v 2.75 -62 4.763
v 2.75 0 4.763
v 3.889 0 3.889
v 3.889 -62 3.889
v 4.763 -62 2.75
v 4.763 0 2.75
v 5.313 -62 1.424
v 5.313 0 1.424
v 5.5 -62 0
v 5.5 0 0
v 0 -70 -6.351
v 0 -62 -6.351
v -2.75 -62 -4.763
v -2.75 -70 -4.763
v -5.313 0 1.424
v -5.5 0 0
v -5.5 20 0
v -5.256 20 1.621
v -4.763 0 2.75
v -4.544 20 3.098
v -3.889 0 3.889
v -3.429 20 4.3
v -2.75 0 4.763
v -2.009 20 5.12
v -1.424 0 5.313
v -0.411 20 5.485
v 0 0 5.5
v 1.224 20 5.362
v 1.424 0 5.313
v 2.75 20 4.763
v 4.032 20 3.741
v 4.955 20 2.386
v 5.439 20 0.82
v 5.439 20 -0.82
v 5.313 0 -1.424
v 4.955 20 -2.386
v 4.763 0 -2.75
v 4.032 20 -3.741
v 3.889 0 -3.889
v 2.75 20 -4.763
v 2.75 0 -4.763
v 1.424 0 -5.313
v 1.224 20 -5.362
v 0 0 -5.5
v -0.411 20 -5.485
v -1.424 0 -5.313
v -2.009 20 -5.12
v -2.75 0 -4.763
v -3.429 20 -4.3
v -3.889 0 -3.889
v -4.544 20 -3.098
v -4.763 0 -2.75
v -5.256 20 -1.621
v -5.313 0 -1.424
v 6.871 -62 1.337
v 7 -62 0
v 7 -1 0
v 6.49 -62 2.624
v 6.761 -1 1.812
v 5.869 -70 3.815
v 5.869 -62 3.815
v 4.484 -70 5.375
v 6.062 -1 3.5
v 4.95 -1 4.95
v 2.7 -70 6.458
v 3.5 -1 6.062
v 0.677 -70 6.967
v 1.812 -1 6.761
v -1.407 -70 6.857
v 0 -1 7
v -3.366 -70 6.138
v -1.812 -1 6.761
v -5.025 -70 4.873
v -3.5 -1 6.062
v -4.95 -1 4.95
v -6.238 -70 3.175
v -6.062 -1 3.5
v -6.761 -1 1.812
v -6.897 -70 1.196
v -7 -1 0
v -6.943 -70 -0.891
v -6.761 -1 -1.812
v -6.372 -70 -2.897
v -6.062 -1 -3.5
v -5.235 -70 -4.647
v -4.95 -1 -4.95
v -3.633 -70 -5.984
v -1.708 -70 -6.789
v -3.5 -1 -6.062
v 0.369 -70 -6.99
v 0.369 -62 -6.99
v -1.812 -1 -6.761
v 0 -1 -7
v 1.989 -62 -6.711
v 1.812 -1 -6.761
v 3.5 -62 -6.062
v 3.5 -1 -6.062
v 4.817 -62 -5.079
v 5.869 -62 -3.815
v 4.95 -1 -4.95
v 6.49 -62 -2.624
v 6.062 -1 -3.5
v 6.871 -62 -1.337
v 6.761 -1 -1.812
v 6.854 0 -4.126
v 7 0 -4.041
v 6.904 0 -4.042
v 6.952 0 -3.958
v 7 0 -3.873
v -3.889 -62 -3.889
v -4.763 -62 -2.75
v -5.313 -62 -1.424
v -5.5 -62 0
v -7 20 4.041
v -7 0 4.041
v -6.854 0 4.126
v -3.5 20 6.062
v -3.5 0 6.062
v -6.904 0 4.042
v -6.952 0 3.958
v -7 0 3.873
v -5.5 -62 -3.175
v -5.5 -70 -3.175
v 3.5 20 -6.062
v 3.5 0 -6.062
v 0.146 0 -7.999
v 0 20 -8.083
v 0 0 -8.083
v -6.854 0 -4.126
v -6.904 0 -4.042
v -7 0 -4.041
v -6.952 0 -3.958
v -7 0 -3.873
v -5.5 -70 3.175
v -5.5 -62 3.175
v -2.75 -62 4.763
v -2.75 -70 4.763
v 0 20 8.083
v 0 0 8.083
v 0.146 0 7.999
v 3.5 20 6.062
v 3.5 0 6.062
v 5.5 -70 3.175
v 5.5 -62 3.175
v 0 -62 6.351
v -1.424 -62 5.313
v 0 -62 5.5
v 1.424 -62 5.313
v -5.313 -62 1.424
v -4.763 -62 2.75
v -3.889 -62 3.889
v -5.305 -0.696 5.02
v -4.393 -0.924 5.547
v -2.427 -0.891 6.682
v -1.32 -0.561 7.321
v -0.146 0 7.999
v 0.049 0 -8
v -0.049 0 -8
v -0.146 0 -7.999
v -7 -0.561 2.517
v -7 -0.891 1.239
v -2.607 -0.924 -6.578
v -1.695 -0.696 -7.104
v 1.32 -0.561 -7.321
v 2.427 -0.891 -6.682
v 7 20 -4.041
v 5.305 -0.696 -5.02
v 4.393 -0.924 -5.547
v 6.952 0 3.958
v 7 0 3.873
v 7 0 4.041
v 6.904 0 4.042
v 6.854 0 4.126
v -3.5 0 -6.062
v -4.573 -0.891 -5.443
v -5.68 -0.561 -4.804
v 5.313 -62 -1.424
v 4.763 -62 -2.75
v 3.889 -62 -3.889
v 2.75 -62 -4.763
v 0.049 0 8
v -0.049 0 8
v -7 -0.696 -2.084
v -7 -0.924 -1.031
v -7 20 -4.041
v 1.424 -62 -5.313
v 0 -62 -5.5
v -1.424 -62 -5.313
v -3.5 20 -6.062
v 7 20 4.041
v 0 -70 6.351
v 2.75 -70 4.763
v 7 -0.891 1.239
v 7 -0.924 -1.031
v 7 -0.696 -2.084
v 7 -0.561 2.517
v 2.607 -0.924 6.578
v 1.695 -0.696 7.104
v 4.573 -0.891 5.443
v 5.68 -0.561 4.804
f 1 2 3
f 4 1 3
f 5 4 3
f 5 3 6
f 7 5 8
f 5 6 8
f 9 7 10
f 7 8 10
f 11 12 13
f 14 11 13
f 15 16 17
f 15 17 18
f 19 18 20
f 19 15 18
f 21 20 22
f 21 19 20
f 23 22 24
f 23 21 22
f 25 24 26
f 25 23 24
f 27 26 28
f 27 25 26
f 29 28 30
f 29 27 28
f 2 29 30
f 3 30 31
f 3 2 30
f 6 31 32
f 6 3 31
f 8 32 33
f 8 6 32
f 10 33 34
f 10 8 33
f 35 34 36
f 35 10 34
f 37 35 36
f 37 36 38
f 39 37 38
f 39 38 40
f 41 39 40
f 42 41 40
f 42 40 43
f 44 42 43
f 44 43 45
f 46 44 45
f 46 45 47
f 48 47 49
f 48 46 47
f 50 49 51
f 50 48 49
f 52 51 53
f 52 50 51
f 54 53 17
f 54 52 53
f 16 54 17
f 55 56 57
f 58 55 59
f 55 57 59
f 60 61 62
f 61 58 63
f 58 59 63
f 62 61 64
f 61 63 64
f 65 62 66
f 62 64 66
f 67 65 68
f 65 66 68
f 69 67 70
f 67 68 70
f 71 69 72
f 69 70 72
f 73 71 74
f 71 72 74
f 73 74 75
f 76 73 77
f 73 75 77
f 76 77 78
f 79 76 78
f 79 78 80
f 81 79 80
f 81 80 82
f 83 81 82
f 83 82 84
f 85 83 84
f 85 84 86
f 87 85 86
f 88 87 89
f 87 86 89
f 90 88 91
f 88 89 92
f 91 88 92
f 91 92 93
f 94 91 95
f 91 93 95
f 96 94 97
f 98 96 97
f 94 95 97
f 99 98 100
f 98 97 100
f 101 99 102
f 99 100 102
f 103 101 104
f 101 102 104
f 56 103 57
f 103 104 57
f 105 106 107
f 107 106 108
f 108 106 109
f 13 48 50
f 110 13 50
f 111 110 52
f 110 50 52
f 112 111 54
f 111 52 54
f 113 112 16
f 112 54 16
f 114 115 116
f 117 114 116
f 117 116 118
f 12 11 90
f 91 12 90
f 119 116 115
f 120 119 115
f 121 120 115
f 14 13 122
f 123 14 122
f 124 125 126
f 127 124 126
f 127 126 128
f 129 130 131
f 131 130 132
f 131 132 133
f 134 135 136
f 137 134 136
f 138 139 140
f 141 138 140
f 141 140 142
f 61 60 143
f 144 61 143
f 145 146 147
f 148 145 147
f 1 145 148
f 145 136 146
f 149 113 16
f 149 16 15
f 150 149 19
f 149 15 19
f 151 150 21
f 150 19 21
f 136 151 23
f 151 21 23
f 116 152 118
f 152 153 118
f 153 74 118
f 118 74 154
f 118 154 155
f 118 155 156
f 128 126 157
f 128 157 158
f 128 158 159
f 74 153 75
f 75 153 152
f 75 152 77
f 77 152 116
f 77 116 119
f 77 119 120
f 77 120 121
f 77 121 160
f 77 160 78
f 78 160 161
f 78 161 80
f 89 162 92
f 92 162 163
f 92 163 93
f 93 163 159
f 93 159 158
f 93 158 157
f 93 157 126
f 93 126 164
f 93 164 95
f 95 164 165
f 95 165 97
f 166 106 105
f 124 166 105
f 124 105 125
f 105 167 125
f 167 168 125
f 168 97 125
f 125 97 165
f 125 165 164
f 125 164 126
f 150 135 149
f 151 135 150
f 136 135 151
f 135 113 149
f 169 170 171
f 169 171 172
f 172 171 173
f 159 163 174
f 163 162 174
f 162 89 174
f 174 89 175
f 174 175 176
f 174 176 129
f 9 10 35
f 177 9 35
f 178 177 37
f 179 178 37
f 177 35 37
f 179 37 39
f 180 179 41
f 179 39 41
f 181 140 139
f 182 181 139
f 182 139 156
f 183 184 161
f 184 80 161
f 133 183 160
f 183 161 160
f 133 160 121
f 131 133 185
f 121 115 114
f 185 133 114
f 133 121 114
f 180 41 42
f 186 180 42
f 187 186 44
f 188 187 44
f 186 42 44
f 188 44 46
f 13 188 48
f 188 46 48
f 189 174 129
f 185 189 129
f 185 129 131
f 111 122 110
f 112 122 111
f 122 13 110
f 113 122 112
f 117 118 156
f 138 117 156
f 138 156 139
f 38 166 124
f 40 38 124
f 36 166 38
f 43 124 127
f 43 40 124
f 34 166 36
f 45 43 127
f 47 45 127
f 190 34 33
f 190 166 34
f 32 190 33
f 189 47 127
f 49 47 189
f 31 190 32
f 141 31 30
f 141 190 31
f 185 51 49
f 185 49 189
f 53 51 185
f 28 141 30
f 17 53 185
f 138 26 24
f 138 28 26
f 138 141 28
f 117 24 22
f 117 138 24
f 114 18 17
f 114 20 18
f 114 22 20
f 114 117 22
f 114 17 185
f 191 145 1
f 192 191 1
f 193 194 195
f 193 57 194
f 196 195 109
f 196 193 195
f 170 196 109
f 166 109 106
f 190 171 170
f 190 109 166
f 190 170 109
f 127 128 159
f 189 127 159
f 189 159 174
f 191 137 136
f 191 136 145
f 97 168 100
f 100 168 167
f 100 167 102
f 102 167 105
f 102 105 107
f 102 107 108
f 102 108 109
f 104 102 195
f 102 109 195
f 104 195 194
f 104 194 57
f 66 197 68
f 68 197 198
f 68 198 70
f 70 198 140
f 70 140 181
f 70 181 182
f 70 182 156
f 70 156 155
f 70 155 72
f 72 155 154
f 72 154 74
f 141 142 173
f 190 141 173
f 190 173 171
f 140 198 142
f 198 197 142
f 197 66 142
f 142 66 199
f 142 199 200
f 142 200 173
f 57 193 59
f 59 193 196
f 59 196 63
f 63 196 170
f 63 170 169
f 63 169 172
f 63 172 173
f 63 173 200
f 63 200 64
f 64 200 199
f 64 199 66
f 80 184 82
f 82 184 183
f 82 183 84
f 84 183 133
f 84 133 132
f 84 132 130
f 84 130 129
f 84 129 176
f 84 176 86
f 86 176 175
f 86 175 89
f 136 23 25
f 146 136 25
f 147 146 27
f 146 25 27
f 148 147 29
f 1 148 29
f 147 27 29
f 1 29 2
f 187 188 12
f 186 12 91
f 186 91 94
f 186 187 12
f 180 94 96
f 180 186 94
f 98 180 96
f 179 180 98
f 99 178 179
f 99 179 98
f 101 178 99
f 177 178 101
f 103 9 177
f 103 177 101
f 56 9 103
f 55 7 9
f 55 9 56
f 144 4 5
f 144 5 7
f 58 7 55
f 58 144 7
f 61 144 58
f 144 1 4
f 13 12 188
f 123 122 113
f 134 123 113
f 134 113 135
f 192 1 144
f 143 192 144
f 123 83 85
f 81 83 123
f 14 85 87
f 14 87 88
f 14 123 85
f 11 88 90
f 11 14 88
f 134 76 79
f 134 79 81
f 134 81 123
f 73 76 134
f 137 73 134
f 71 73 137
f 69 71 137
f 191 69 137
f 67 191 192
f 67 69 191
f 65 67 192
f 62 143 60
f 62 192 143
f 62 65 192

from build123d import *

# Parameters (mm, degrees)
F0_R         = 7
F1_DEPTH     = 70
F2_DEPTH     = 62
F3_R         = 5.5
F4_DEPTH     = 20
F6_DEPTH     = 8
F7_T4_ANGLE  = 59.9999999128
F7_T10_ANGLE = 59.9999996333
F7_T16_ANGLE = 60.0000004539
F7_T22_ANGLE = 59.9999999128
F7_T28_ANGLE = 60.0000002811
F7_T34_ANGLE = 59.9999998061


# Not quite as in the source:
# - a fillet or chamfer that OpenCascade refuses, or shapes differently, is made with other operations: its cross-section is extruded or revolved along the edge and cut away or added


with BuildPart() as f1:
    # F0 (on Front) → F1 (new body)
    with BuildSketch(Plane.XZ):
        Circle(F0_R)
        Polygon((2.7500007272, 4.7631393009), (5.5, 3.1754264805), (5.5, 0), (5.5, -3.1754264805), (2.7499994424, -4.7631400427), (0, -6.3508529611), (-2.7500008008, -4.7631392585), (-5.5, -3.1754264805), (-5.5, 0), (-5.5, 3.1754264805), (-2.7500002446, 4.7631395796), (0, 6.3508529611), align=None, mode=Mode.SUBTRACT)
    extrude(amount=F1_DEPTH)

    # F0 (on Front) → F2 (join)
    with BuildSketch(Plane.XZ):
        with BuildLine():
            Line((5.5, -3.1754264805), (5.5, 0))
            ThreePointArc((5.5, 0), (4.7631395599, -2.7500002788), (2.7499994424, -4.7631400427))
            Line((2.7499994424, -4.7631400427), (5.5, -3.1754264805))
        make_face()
        with BuildLine():
            Line((0, -6.3508529611), (2.7499994424, -4.7631400427))
            ThreePointArc((2.7499994424, -4.7631400427), (-7.842e-07, -5.5), (-2.7500008008, -4.7631392585))
            Line((-2.7500008008, -4.7631392585), (0, -6.3508529611))
        make_face()
        with BuildLine():
            Line((-5.5, -3.1754264805), (-2.7500008008, -4.7631392585))
            ThreePointArc((-2.7500008008, -4.7631392585), (-4.763139952, -2.7499995996), (-5.5, 0))
            Line((-5.5, 0), (-5.5, -3.1754264805))
        make_face()
        with BuildLine():
            ThreePointArc((-5.5, 0), (-4.7631397914, 2.7499998777), (-2.7500002446, 4.7631395796))
            Line((-2.7500002446, 4.7631395796), (-5.5, 3.1754264805))
            Line((-5.5, 3.1754264805), (-5.5, 0))
        make_face()
        with BuildLine():
            ThreePointArc((-2.7500002446, 4.7631395796), (2.787e-07, 5.5), (2.7500007272, 4.7631393009))
            Line((2.7500007272, 4.7631393009), (0, 6.3508529611))
            Line((0, 6.3508529611), (-2.7500002446, 4.7631395796))
        make_face()
        with BuildLine():
            Line((5.5, 0), (5.5, 3.1754264805))
            Line((5.5, 3.1754264805), (2.7500007272, 4.7631393009))
            ThreePointArc((2.7500007272, 4.7631393009), (4.7631399308, 2.7499996364), (5.5, 0))
        make_face()
    extrude(amount=F2_DEPTH)

    # F3 (on face) → F4 (join)
    with BuildSketch(Plane(origin=(0, 0, 0), x_dir=(-1, 0, 0), z_dir=(0, 1, 0))):
        with BuildLine():
            Line((-7, 0), (-7, -4.0414518843))
            Line((-7, -4.0414518843), (-3.5000000457, -6.0621778001))
            ThreePointArc((-3.5000000457, -6.0621778001), (-6.0621778397, -3.4999999772), (-7, 0))
        make_face()
        with BuildLine():
            Line((-7, 4.0414518843), (-7, 0))
            ThreePointArc((-7, 0), (-6.0621778147, 3.5000000204), (-3.4999999591, 6.0621778501))
            Line((-3.4999999591, 6.0621778501), (-7, 4.0414518843))
        make_face()
        with BuildLine():
            ThreePointArc((-3.4999999591, 6.0621778501), (-6.0621778147, 3.5000000204), (-7, 0))
            ThreePointArc((-7, 0), (-6.0621778397, -3.4999999772), (-3.5000000457, -6.0621778001))
            ThreePointArc((-3.5000000457, -6.0621778001), (-3.61e-08, -7), (3.4999999831, -6.0621778362))
            ThreePointArc((3.4999999831, -6.0621778362), (6.0621778216, -3.5000000084), (7, 0))
            ThreePointArc((7, 0), (6.06217782, 3.5000000113), (3.4999999774, 6.0621778395))
            ThreePointArc((3.4999999774, 6.0621778395), (1.05e-08, 7), (-3.4999999591, 6.0621778501))
        make_face()
        Circle(F3_R, mode=Mode.SUBTRACT)
        with BuildLine():
            ThreePointArc((3.4999999831, -6.0621778362), (-3.61e-08, -7), (-3.5000000457, -6.0621778001))
            Line((-3.5000000457, -6.0621778001), (0, -8.0829037687))
            Line((0, -8.0829037687), (3.4999999831, -6.0621778362))
        make_face()
        with BuildLine():
            Line((0, 8.0829037687), (-3.4999999591, 6.0621778501))
            ThreePointArc((-3.4999999591, 6.0621778501), (1.05e-08, 7), (3.4999999774, 6.0621778395))
            Line((3.4999999774, 6.0621778395), (0, 8.0829037687))
        make_face()
        with BuildLine():
            ThreePointArc((7, 0), (6.0621778216, -3.5000000084), (3.4999999831, -6.0621778362))
            Line((3.4999999831, -6.0621778362), (7, -4.0414518843))
            Line((7, -4.0414518843), (7, 0))
        make_face()
        with BuildLine():
            Line((7, 4.0414518843), (3.4999999774, 6.0621778395))
            ThreePointArc((3.4999999774, 6.0621778395), (6.06217782, 3.5000000113), (7, 0))
            Line((7, 0), (7, 4.0414518843))
        make_face()
    extrude(amount=F4_DEPTH)

    # F5 (on face) → F6 (cut, through all)
    with BuildSketch(Plane.XZ.offset(70)):
        with BuildLine():
            Line((5.5, 3.1754264805), (5.5, -3.1754264805))
            Line((5.5, -3.1754264805), (5.869161212, -3.814832456))
            ThreePointArc((5.869161212, -3.814832456), (6.7113384837, -1.9894561463), (7, 0))
            ThreePointArc((7, 0), (6.7113384837, 1.9894561463), (5.869161212, 3.814832456))
            Line((5.869161212, 3.814832456), (5.5, 3.1754264805))
        make_face()
        with BuildLine():
            Line((5.869161212, -3.814832456), (5.5, -3.1754264805))
            Line((5.5, -3.1754264805), (0, -6.3508529611))
            Line((0, -6.3508529611), (0.369161212, -6.9902589365))
            ThreePointArc((0.369161212, -6.9902589365), (3.5, -6.0621778265), (5.869161212, -3.814832456))
        make_face()
    extrude(amount=-F6_DEPTH, mode=Mode.SUBTRACT)

    # F7: chamfer of 1 on 6 edges, made by hand


with BuildPart() as f7_tool2:
    # F7_s3 → F7_t4 (revolve)
    with BuildSketch(Plane.XY):
        Polygon((-7, -1), (-8, 0), (-7, 0), align=None)
    revolve(axis=Axis((0, 0, 0), (0, -1, 0)), revolution_arc=F7_T4_ANGLE)

    split(bisect_by=Plane.YZ.offset(-7), keep=Keep.TOP)

    split(bisect_by=Plane(origin=(-3.5, 0, -6.0621778265), x_dir=(0, 1, 0), z_dir=(0.5, 0, 0.8660254038)), keep=Keep.TOP)


with BuildPart() as f1_1:
    add(f1.part)

    # F7_t1: union F7_tool2
    add(f7_tool2.part)


with BuildPart() as f7_tool8:
    # F7_s9 → F7_t10 (revolve)
    with BuildSketch(Plane.XY):
        Polygon((7, -1), (8, 0), (7, 0), align=None)
    revolve(axis=Axis((0, 0, 0), (0, -1, 0)), revolution_arc=F7_T10_ANGLE)

    split(bisect_by=Plane(origin=(3.5, 0, 6.0621778265), x_dir=(0, 1, 0), z_dir=(-0.5, 0, -0.8660254038)), keep=Keep.TOP)

    split(bisect_by=Plane.YZ.offset(7), keep=Keep.BOTTOM)


with BuildPart() as f1_2:
    add(f1_1.part)

    # F7_t7: union F7_tool8
    add(f7_tool8.part)


with BuildPart() as f7_tool14:
    # F7_s15 → F7_t16 (revolve)
    with BuildSketch(Plane(origin=(0, 0, 0), x_dir=(0, 1, 0), z_dir=(0.8660254006, 0, -0.5000000055))):
        Polygon((-1, 7), (0, 8), (0, 7), align=None)
    revolve(axis=Axis((0, 0, 0), (0, -1, 0)), revolution_arc=F7_T16_ANGLE)

    split(bisect_by=Plane(origin=(3.5, 0, 6.0621778265), x_dir=(0, 1, 0), z_dir=(-0.5, 0, -0.8660254038)), keep=Keep.TOP)

    split(bisect_by=Plane(origin=(-3.5, 0, 6.0621778265), x_dir=(0, 1, 0), z_dir=(0.5, 0, -0.8660254038)), keep=Keep.TOP)


with BuildPart() as f1_3:
    add(f1_2.part)

    # F7_t13: union F7_tool14
    add(f7_tool14.part)


with BuildPart() as f7_tool20:
    # F7_s21 → F7_t22 (revolve)
    with BuildSketch(Plane(origin=(0, 0, 0), x_dir=(0, 1, 0), z_dir=(0.866025403, 0, 0.5000000013))):
        Polygon((-1, 7), (0, 8), (0, 7), align=None)
    revolve(axis=Axis((0, 0, 0), (0, -1, 0)), revolution_arc=F7_T22_ANGLE)

    split(bisect_by=Plane(origin=(-3.5, 0, 6.0621778265), x_dir=(0, 1, 0), z_dir=(0.5, 0, -0.8660254038)), keep=Keep.TOP)

    split(bisect_by=Plane.YZ.offset(-7), keep=Keep.TOP)


with BuildPart() as f1_4:
    add(f1_3.part)

    # F7_t19: union F7_tool20
    add(f7_tool20.part)


with BuildPart() as f7_tool26:
    # F7_s27 → F7_t28 (revolve)
    with BuildSketch(Plane(origin=(0, 0, 0), x_dir=(0, 1, 0), z_dir=(-0.866025403, 0, 0.5000000013))):
        Polygon((-1, 7), (0, 8), (0, 7), align=None)
    revolve(axis=Axis((0, 0, 0), (0, -1, 0)), revolution_arc=F7_T28_ANGLE)

    split(bisect_by=Plane(origin=(3.5, 0, -6.0621778265), x_dir=(0, 1, 0), z_dir=(-0.5, 0, 0.8660254038)), keep=Keep.TOP)

    split(bisect_by=Plane(origin=(-3.5, 0, -6.0621778265), x_dir=(0, 1, 0), z_dir=(0.5, 0, 0.8660254038)), keep=Keep.TOP)


with BuildPart() as f1_5:
    add(f1_4.part)

    # F7_t25: union F7_tool26
    add(f7_tool26.part)


with BuildPart() as f7_tool32:
    # F7_s33 → F7_t34 (revolve)
    with BuildSketch(Plane(origin=(0, 0, 0), x_dir=(0, 1, 0), z_dir=(-0.8660254021, 0, -0.5000000029))):
        Polygon((-1, 7), (0, 8), (0, 7), align=None)
    revolve(axis=Axis((0, 0, 0), (0, -1, 0)), revolution_arc=F7_T34_ANGLE)

    split(bisect_by=Plane(origin=(3.5, 0, -6.0621778265), x_dir=(0, 1, 0), z_dir=(-0.5, 0, 0.8660254038)), keep=Keep.TOP)

    split(bisect_by=Plane.YZ.offset(7), keep=Keep.BOTTOM)


with BuildPart() as f1_6:
    add(f1_5.part)

    # F7_t31: union F7_tool32
    add(f7_tool32.part)


solid = f1_6.part
